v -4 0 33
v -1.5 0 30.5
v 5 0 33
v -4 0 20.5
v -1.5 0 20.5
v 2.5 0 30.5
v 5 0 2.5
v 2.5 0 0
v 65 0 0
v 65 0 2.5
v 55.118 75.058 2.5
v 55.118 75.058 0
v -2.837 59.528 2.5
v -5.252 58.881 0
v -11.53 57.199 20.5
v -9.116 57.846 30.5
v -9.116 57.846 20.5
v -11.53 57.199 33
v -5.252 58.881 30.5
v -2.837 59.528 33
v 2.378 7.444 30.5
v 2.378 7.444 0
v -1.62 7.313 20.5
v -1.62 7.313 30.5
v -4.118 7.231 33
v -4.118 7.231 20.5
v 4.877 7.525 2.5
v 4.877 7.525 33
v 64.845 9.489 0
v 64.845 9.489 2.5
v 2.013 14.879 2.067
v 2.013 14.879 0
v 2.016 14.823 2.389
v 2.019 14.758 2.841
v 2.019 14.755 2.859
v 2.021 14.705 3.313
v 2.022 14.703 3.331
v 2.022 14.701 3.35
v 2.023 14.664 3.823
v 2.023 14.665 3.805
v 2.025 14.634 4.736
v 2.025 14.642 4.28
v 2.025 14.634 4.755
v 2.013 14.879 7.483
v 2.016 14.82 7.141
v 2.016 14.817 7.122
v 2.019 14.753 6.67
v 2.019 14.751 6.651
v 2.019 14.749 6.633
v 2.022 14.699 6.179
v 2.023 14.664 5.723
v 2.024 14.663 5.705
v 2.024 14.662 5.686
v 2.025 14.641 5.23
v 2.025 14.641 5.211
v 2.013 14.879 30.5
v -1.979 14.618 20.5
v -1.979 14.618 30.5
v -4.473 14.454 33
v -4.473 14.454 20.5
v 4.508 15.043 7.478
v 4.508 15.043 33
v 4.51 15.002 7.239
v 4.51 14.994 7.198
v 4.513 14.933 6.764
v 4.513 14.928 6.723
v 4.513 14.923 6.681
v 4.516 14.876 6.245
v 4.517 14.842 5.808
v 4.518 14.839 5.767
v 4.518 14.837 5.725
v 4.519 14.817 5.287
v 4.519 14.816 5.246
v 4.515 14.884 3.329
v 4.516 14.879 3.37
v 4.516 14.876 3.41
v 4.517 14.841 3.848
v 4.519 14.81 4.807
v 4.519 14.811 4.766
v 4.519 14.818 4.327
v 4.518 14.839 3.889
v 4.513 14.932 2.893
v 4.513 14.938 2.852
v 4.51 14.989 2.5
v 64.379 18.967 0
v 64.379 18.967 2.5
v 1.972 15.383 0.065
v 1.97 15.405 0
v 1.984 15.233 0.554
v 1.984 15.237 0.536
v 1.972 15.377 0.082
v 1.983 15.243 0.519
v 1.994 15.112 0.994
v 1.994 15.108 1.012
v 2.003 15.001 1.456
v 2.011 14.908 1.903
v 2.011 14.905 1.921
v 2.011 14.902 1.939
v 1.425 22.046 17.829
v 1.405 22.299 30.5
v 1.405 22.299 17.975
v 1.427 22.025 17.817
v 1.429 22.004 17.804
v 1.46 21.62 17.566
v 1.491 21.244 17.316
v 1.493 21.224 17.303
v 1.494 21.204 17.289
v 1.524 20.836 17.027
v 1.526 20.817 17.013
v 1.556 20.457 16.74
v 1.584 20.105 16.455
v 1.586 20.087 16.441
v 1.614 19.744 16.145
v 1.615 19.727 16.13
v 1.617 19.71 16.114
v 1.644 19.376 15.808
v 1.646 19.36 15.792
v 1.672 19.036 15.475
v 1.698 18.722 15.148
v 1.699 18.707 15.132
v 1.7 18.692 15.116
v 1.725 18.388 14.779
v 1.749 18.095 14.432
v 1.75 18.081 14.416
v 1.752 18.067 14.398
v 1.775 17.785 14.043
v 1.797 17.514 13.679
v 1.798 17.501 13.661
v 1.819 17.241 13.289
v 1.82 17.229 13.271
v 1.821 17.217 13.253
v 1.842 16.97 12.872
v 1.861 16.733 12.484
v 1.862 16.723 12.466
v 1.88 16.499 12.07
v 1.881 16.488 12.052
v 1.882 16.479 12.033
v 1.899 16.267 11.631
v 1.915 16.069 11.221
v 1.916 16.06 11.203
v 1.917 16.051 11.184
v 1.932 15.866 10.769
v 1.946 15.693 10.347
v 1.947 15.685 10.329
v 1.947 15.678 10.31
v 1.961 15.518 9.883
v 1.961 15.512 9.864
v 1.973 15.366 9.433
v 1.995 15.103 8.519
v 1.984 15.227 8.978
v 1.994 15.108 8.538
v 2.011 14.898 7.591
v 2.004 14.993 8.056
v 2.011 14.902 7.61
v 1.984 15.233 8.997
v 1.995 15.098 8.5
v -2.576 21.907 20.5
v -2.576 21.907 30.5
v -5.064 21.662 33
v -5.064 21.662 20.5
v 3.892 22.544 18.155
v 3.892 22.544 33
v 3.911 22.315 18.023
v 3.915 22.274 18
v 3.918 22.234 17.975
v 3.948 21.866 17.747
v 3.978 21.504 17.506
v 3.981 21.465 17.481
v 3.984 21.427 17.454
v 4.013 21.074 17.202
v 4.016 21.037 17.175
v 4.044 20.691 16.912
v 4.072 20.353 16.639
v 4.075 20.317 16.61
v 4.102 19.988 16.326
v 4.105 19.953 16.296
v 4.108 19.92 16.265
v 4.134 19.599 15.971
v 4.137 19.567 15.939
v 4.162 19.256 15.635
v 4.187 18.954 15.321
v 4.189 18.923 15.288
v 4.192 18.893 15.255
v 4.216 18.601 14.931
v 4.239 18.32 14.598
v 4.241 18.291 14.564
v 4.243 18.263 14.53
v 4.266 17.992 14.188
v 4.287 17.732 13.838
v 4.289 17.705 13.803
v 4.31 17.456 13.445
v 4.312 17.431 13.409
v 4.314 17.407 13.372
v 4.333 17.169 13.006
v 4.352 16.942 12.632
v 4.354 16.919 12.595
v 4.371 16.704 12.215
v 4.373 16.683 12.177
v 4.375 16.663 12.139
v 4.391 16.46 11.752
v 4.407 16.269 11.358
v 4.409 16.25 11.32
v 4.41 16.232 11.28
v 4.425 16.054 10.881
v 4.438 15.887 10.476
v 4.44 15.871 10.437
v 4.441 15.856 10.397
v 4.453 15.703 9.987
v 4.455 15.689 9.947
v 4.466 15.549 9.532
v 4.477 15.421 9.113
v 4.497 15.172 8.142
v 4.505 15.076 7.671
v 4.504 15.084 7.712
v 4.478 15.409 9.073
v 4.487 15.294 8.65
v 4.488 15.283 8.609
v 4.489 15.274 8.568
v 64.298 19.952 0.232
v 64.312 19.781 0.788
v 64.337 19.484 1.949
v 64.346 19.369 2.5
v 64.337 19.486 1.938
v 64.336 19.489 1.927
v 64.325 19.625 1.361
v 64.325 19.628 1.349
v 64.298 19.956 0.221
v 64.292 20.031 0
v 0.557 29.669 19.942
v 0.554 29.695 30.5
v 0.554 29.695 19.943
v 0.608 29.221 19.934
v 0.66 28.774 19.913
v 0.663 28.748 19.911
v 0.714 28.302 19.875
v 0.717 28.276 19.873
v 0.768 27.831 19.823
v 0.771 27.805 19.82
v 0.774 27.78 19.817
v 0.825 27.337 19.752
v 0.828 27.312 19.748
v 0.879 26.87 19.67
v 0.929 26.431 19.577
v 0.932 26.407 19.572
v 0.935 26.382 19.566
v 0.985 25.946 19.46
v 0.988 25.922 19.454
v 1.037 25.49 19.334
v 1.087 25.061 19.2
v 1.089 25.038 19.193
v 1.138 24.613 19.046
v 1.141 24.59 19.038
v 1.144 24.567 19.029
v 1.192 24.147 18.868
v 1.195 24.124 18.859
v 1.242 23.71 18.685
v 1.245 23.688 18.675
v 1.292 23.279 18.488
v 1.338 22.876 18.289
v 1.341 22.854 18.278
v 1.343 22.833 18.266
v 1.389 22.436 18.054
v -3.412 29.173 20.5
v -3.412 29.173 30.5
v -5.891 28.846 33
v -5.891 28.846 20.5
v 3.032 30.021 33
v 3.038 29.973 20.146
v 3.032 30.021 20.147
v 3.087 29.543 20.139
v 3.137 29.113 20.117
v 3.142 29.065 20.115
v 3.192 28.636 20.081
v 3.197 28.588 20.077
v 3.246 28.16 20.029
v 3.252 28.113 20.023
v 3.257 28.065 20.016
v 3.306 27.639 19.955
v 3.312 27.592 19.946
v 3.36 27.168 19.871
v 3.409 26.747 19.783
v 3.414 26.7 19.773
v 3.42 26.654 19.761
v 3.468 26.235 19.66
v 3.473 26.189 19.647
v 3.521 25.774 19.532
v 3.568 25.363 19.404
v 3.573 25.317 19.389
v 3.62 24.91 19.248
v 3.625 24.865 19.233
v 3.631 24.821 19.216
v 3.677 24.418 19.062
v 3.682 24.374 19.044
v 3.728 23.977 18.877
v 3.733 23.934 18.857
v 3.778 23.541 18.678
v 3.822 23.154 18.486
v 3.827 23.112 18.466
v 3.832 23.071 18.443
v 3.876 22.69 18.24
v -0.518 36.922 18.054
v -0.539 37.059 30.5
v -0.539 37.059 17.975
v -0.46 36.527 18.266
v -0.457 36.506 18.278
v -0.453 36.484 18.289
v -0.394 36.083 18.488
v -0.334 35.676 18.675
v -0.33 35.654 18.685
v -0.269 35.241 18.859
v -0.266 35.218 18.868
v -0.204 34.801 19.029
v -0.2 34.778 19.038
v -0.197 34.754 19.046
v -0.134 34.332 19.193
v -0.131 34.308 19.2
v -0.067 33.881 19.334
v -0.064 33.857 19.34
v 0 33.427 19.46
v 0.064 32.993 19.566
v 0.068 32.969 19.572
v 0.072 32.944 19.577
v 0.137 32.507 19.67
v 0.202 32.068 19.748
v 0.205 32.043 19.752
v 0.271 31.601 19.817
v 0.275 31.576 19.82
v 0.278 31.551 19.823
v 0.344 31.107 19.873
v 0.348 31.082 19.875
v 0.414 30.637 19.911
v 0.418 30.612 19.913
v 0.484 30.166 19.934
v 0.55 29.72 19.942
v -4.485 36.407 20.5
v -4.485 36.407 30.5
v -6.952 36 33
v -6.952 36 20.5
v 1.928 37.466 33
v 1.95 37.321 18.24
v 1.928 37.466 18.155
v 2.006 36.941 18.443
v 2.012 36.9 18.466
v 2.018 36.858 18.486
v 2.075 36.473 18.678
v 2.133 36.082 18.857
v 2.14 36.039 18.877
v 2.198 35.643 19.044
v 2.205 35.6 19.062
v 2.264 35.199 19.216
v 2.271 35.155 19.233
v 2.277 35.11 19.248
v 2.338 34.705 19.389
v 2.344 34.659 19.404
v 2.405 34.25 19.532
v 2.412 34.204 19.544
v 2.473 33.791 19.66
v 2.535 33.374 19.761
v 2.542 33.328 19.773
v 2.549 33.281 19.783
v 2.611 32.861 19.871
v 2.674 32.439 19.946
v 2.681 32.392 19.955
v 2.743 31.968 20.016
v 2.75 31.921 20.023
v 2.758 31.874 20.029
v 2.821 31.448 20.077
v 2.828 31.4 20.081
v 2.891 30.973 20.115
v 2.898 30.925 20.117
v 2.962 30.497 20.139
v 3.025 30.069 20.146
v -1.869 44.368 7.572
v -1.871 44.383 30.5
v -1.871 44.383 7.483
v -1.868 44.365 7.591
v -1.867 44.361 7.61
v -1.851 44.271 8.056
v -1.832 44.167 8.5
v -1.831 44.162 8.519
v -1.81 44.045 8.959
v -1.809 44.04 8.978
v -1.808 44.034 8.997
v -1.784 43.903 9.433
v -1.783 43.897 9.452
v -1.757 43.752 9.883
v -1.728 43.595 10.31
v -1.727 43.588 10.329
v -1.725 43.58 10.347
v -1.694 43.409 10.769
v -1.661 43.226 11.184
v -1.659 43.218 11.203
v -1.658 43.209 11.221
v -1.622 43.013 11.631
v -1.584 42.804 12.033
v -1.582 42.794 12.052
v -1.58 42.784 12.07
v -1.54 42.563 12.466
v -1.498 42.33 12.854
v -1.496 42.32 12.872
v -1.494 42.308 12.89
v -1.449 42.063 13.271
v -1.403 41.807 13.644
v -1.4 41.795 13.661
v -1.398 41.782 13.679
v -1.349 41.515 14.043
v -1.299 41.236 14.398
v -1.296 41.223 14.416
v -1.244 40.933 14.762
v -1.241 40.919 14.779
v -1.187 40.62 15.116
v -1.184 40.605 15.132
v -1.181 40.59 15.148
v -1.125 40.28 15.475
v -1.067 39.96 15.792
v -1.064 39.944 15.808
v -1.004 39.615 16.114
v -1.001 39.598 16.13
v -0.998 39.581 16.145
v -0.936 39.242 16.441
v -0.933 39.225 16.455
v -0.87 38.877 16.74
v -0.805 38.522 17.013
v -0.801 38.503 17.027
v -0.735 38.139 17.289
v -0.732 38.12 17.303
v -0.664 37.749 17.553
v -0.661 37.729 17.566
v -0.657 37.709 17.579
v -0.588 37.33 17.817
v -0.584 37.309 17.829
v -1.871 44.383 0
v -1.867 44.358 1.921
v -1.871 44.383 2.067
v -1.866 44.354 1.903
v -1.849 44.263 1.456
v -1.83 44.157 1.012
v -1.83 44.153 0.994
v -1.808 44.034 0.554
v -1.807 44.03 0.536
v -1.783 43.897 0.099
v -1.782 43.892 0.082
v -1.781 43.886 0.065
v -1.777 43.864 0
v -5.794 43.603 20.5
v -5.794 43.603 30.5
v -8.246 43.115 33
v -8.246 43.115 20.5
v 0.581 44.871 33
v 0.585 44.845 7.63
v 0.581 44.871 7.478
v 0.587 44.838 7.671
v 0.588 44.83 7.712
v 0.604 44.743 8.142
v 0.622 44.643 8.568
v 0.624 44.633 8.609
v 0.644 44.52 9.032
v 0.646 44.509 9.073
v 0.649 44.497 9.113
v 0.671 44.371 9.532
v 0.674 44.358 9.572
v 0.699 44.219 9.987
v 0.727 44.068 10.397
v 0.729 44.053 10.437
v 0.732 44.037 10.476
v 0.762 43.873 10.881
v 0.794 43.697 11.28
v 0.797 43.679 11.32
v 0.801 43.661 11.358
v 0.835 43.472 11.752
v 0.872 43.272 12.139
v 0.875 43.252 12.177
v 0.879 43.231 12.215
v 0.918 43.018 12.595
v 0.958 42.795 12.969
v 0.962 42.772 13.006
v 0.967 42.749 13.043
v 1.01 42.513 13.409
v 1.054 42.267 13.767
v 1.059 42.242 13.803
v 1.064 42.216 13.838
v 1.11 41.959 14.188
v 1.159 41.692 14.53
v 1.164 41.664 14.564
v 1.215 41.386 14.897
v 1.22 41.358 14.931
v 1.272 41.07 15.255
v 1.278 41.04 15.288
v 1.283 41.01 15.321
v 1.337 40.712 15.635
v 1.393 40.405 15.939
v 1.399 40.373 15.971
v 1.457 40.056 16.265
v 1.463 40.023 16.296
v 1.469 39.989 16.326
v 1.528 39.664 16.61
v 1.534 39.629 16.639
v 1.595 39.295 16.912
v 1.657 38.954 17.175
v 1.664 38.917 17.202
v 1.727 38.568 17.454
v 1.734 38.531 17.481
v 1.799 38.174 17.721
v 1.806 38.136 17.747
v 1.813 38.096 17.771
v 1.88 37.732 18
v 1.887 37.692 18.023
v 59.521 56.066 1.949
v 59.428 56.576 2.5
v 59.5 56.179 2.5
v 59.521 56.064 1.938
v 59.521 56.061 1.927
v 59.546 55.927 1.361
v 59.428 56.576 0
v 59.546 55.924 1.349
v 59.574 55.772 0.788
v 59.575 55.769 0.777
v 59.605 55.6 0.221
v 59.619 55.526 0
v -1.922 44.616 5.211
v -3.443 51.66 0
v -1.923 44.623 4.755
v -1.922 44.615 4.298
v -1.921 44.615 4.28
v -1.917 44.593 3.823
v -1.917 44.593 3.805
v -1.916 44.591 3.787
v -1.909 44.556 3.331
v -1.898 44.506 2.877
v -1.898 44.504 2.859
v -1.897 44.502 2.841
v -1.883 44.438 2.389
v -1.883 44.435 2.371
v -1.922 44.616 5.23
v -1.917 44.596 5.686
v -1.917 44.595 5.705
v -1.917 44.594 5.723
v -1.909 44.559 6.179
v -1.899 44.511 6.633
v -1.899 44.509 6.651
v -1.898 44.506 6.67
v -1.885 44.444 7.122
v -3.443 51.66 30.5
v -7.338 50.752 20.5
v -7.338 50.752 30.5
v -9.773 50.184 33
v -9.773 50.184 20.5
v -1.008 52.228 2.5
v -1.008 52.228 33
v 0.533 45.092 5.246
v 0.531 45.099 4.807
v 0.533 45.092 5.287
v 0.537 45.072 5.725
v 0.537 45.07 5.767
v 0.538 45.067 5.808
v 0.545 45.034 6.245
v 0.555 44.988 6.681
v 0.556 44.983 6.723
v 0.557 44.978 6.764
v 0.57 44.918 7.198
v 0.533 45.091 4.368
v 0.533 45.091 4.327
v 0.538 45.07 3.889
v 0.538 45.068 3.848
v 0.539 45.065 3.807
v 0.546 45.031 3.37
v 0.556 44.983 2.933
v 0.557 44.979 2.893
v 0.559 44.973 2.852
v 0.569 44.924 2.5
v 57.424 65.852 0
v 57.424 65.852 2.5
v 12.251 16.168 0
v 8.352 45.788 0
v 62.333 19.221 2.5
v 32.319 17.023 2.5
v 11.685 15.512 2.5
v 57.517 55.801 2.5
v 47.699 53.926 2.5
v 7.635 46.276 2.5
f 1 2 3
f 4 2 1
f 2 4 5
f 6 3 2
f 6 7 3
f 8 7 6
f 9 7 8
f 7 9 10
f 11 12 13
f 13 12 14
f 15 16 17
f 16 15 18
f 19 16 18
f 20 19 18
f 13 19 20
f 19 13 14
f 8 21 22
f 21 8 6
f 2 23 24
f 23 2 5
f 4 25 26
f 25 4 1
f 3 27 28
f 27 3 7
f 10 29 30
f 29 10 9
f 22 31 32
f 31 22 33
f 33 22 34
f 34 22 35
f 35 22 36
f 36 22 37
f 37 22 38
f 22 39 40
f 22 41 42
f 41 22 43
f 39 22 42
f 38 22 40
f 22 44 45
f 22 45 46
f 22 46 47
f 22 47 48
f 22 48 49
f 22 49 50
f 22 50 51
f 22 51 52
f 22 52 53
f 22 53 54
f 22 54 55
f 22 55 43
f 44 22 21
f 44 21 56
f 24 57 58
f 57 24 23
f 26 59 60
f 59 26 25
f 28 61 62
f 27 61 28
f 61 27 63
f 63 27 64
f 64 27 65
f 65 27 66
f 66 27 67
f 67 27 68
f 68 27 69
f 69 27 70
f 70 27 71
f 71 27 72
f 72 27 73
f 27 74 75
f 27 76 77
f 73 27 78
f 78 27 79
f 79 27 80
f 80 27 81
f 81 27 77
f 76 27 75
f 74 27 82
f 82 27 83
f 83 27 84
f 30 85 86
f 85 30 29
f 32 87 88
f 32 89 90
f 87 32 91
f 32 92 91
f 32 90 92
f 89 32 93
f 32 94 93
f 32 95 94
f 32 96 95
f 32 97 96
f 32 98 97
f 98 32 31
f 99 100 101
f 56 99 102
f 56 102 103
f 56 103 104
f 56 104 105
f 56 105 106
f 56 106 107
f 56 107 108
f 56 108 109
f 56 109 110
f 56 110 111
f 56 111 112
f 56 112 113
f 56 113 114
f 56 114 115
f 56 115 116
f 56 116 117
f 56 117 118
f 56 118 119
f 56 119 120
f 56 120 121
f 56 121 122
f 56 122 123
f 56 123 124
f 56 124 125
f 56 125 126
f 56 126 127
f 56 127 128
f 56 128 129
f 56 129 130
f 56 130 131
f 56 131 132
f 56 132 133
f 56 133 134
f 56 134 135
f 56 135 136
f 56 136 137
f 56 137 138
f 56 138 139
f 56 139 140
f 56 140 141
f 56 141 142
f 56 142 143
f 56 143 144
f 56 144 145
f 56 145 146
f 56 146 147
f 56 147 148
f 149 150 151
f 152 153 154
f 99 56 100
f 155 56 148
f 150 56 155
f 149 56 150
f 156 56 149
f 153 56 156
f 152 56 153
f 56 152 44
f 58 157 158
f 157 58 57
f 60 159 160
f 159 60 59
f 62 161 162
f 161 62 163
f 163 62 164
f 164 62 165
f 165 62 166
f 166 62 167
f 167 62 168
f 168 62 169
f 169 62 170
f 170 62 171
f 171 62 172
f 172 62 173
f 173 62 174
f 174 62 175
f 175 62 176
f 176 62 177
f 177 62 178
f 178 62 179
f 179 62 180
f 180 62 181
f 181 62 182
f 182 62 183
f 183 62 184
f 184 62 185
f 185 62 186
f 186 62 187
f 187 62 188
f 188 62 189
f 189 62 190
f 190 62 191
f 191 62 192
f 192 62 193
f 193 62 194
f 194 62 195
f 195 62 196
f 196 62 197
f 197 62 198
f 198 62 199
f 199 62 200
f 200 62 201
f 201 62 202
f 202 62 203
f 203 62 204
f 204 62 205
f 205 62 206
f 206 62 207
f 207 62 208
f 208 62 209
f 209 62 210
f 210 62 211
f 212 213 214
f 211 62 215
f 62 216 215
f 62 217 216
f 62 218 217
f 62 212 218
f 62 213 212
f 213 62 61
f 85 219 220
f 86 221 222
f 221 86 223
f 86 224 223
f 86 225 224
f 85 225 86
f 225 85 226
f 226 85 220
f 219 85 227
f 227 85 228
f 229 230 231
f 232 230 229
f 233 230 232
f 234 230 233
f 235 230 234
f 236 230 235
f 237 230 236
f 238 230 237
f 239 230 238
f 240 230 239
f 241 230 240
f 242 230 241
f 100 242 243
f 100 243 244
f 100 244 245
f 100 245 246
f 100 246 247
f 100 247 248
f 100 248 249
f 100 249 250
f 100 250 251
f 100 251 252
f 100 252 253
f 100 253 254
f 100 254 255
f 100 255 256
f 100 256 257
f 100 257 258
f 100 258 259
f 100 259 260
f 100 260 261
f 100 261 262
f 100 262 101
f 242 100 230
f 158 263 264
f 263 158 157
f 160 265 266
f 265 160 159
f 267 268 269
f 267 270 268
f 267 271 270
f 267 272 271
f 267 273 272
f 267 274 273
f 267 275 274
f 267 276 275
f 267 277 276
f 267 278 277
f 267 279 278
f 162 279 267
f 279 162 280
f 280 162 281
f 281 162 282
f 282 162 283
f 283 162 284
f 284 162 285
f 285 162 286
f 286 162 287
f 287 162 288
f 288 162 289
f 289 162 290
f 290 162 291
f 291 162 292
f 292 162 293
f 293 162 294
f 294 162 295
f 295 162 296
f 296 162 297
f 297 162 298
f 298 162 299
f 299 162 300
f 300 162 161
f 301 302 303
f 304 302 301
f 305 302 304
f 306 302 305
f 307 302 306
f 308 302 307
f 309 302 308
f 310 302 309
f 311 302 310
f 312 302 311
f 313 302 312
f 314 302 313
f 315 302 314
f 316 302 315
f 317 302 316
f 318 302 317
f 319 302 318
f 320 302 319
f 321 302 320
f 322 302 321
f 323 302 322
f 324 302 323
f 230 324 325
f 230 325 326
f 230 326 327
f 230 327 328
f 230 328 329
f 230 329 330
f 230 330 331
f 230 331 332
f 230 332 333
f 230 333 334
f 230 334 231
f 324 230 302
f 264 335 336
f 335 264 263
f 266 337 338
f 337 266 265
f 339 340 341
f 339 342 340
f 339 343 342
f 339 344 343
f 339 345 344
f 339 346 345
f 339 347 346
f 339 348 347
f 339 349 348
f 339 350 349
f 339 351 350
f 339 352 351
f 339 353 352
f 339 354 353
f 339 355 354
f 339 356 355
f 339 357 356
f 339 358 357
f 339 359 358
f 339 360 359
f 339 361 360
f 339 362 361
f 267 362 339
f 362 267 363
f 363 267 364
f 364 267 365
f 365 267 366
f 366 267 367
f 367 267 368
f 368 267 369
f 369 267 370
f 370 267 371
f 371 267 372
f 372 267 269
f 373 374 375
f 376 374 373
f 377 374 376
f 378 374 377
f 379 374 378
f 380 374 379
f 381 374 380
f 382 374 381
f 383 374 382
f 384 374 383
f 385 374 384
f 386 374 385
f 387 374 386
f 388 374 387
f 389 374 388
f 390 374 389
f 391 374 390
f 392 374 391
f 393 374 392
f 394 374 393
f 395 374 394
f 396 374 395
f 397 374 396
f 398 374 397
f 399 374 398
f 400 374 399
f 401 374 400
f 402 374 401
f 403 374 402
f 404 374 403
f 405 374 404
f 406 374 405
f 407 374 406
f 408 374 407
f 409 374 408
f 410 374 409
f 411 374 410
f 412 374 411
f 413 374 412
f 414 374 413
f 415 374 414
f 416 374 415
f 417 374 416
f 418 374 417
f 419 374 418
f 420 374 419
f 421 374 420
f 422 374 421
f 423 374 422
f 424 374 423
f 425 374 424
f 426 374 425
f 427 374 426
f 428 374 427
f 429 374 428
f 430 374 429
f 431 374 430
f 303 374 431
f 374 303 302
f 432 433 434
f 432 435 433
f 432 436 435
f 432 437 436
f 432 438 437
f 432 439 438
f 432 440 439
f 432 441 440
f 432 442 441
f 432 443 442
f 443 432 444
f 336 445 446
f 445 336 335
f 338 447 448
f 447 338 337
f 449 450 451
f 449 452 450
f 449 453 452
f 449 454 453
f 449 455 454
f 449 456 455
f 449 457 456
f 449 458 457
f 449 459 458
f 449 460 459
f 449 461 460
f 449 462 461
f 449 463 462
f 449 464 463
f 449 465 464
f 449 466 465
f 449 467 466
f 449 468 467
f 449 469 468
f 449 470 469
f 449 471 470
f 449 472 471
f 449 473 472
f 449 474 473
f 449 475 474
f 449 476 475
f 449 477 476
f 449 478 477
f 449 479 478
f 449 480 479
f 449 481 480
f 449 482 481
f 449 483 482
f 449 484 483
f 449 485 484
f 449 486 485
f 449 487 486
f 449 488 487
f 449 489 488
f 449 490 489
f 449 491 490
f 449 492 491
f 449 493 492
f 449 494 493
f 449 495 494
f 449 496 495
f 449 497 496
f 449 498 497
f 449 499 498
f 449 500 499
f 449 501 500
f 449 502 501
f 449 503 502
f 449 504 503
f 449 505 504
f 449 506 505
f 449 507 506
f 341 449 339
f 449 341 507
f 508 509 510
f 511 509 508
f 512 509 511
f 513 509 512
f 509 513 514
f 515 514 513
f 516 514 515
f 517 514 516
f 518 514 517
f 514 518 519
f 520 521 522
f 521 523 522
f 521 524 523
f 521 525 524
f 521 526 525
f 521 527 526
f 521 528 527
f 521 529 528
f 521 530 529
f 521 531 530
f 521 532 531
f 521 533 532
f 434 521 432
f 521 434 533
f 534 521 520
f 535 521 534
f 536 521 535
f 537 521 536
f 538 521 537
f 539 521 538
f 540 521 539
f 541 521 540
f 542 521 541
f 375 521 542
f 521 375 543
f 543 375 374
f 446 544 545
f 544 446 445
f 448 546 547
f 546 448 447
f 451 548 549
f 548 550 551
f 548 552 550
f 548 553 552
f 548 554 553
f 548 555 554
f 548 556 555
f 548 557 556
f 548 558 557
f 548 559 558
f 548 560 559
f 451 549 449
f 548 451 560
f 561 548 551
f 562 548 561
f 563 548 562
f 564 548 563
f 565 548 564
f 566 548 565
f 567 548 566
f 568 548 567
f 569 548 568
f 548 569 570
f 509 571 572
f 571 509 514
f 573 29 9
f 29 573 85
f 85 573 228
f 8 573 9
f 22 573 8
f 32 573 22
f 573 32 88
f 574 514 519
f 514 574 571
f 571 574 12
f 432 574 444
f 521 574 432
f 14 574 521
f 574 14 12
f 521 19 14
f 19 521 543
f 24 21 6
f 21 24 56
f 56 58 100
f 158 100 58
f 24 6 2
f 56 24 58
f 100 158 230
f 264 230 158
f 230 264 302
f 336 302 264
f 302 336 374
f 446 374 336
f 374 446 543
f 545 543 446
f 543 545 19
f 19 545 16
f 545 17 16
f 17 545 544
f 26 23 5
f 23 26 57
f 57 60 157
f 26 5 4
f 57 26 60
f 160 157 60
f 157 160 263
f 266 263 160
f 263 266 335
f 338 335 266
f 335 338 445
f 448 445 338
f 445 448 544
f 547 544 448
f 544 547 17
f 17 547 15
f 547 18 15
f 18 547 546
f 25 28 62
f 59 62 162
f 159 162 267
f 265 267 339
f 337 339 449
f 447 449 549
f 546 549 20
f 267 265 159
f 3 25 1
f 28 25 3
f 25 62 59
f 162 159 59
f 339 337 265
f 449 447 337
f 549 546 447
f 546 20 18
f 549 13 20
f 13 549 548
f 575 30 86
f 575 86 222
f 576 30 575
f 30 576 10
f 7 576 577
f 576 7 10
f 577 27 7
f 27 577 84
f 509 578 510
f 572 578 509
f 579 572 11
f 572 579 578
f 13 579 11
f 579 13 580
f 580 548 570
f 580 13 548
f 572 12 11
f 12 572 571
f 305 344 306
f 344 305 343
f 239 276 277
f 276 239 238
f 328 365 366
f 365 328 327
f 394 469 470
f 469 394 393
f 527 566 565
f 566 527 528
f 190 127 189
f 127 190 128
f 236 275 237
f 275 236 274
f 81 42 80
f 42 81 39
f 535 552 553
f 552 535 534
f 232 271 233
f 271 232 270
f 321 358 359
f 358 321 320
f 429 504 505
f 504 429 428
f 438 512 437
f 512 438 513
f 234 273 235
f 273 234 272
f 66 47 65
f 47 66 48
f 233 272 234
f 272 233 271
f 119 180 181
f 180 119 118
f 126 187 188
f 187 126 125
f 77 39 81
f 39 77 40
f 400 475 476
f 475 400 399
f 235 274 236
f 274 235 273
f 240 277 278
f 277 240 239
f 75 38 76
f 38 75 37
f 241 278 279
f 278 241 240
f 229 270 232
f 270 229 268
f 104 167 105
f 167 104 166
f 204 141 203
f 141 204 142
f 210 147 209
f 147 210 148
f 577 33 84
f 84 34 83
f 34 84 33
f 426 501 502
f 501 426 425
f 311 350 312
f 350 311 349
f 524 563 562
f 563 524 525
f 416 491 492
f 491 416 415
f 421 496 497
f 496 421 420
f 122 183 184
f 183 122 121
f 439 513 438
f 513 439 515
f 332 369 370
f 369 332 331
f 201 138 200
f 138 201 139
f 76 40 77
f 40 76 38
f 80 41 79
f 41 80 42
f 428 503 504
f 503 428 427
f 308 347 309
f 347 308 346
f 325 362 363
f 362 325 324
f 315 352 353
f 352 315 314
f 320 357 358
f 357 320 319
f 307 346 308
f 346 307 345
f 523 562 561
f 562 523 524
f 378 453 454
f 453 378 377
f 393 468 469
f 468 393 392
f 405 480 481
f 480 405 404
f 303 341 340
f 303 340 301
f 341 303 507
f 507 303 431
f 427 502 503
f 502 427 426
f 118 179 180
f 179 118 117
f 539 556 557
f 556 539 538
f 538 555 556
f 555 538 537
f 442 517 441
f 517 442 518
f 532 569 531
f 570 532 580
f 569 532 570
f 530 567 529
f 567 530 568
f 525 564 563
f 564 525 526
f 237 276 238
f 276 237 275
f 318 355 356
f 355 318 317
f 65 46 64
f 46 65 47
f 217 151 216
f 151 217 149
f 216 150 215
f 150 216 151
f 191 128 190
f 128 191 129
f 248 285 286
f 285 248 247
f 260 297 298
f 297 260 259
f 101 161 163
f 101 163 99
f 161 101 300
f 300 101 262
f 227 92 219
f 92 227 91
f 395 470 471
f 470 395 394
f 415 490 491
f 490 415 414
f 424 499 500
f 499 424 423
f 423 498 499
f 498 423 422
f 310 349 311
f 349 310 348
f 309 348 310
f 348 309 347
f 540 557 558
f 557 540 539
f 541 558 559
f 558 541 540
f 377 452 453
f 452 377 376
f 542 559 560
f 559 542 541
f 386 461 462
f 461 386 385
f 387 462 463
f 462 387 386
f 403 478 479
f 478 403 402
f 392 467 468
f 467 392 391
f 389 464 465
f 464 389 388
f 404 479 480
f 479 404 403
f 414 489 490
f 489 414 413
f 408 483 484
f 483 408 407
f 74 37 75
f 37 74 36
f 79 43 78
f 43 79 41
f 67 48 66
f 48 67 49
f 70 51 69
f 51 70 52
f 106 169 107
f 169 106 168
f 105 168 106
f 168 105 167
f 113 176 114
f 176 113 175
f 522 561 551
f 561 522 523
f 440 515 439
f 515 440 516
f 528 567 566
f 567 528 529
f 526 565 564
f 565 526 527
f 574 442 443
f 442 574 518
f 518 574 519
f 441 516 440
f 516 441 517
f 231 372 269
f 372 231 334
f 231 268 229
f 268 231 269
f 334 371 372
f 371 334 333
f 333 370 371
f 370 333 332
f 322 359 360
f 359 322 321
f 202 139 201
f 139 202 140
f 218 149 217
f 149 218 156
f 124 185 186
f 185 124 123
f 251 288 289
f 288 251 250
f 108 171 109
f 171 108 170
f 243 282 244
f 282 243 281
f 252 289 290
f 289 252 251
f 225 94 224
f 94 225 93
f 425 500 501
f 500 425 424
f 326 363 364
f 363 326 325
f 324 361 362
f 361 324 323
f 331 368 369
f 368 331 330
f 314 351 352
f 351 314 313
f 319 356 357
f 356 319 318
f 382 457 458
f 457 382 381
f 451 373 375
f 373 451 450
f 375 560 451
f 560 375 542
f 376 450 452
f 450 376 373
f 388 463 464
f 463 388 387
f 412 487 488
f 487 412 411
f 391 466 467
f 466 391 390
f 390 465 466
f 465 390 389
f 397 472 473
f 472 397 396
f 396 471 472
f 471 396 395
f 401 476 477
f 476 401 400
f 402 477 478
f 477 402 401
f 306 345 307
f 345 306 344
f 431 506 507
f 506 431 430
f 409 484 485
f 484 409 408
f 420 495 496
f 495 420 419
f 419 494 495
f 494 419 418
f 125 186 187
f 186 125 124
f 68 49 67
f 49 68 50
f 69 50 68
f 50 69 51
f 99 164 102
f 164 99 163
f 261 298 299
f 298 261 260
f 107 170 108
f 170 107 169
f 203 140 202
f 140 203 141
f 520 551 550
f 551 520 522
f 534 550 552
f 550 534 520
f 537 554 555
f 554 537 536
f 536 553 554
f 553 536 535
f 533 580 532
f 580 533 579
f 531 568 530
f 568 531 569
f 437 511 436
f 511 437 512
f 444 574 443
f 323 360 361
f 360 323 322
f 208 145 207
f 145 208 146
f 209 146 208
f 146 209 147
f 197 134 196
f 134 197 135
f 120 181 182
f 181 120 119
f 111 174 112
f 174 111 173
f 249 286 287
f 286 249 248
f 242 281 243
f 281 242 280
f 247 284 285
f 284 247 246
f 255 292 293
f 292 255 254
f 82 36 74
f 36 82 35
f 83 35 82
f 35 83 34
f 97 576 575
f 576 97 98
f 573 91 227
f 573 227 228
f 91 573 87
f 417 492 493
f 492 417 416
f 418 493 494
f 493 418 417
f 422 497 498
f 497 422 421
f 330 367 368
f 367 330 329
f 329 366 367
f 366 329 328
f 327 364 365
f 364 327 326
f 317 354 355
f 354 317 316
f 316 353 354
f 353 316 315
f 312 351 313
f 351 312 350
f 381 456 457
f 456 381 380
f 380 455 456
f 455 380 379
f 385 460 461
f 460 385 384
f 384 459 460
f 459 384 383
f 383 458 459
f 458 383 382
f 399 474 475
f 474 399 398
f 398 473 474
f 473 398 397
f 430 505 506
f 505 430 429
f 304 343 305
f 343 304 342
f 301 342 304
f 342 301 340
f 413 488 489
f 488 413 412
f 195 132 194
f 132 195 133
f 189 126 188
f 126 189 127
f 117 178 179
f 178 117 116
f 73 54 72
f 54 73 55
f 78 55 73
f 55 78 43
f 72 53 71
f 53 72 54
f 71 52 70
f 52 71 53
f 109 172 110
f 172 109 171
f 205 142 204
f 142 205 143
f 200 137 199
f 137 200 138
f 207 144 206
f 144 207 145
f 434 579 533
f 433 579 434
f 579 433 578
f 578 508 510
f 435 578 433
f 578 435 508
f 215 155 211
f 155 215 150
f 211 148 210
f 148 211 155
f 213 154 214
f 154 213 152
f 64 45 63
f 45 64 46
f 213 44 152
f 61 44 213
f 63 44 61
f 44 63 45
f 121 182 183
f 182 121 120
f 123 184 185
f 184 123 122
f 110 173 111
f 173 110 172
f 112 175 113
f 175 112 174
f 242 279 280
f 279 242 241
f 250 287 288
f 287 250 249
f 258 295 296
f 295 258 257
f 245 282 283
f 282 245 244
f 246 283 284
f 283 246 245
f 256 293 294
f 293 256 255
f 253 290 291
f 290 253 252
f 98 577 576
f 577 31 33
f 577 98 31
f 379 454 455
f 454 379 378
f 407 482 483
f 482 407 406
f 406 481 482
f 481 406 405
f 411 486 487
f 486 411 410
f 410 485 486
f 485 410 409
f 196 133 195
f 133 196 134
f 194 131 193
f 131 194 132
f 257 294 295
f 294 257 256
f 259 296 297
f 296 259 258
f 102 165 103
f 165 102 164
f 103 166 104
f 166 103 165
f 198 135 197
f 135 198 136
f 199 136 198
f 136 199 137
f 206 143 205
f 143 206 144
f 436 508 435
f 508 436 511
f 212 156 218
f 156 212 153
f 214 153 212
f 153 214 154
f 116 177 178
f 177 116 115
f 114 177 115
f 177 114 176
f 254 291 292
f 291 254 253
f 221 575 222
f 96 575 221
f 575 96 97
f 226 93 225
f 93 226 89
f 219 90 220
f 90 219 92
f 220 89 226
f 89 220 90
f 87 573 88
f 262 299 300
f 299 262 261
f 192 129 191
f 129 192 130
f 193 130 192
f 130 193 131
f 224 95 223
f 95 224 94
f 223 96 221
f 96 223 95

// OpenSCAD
$fn=200;

height = 33;
depth = 50;
overhangdepth = 4;
overhangdrop = 10;
protrude = 60;
thickness = 2.5;
lip = 0;
revolve = 225;
revolution = 15;
cutout = 15;

module soapdish(){
    difference () {
    rotate_extrude(angle=revolution)
        translate ([revolve+thickness,0,0])
            polygon(
                points=[
                [0,0],
                [0,height-thickness],
                [-overhangdepth,height-thickness],
                [-overhangdepth,height-thickness-overhangdrop],
                [-overhangdepth-thickness,height-thickness-overhangdrop],
                [-overhangdepth-thickness,height],
                [thickness,height],
                [thickness,thickness],
                [protrude,thickness],
                [protrude,thickness+lip],
                [protrude+thickness,thickness+lip],
                [protrude+thickness,0]
                ]
            );
    rotate ([0,88.8,revolution/2])
        translate ([0,0,revolve])
        cylinder (
            h = protrude+(thickness*2)+1,
            r1=cutout,
            r2=cutout+4);
        }
}

// Render

translate ([-revolve,0,0])
    soapdish();
